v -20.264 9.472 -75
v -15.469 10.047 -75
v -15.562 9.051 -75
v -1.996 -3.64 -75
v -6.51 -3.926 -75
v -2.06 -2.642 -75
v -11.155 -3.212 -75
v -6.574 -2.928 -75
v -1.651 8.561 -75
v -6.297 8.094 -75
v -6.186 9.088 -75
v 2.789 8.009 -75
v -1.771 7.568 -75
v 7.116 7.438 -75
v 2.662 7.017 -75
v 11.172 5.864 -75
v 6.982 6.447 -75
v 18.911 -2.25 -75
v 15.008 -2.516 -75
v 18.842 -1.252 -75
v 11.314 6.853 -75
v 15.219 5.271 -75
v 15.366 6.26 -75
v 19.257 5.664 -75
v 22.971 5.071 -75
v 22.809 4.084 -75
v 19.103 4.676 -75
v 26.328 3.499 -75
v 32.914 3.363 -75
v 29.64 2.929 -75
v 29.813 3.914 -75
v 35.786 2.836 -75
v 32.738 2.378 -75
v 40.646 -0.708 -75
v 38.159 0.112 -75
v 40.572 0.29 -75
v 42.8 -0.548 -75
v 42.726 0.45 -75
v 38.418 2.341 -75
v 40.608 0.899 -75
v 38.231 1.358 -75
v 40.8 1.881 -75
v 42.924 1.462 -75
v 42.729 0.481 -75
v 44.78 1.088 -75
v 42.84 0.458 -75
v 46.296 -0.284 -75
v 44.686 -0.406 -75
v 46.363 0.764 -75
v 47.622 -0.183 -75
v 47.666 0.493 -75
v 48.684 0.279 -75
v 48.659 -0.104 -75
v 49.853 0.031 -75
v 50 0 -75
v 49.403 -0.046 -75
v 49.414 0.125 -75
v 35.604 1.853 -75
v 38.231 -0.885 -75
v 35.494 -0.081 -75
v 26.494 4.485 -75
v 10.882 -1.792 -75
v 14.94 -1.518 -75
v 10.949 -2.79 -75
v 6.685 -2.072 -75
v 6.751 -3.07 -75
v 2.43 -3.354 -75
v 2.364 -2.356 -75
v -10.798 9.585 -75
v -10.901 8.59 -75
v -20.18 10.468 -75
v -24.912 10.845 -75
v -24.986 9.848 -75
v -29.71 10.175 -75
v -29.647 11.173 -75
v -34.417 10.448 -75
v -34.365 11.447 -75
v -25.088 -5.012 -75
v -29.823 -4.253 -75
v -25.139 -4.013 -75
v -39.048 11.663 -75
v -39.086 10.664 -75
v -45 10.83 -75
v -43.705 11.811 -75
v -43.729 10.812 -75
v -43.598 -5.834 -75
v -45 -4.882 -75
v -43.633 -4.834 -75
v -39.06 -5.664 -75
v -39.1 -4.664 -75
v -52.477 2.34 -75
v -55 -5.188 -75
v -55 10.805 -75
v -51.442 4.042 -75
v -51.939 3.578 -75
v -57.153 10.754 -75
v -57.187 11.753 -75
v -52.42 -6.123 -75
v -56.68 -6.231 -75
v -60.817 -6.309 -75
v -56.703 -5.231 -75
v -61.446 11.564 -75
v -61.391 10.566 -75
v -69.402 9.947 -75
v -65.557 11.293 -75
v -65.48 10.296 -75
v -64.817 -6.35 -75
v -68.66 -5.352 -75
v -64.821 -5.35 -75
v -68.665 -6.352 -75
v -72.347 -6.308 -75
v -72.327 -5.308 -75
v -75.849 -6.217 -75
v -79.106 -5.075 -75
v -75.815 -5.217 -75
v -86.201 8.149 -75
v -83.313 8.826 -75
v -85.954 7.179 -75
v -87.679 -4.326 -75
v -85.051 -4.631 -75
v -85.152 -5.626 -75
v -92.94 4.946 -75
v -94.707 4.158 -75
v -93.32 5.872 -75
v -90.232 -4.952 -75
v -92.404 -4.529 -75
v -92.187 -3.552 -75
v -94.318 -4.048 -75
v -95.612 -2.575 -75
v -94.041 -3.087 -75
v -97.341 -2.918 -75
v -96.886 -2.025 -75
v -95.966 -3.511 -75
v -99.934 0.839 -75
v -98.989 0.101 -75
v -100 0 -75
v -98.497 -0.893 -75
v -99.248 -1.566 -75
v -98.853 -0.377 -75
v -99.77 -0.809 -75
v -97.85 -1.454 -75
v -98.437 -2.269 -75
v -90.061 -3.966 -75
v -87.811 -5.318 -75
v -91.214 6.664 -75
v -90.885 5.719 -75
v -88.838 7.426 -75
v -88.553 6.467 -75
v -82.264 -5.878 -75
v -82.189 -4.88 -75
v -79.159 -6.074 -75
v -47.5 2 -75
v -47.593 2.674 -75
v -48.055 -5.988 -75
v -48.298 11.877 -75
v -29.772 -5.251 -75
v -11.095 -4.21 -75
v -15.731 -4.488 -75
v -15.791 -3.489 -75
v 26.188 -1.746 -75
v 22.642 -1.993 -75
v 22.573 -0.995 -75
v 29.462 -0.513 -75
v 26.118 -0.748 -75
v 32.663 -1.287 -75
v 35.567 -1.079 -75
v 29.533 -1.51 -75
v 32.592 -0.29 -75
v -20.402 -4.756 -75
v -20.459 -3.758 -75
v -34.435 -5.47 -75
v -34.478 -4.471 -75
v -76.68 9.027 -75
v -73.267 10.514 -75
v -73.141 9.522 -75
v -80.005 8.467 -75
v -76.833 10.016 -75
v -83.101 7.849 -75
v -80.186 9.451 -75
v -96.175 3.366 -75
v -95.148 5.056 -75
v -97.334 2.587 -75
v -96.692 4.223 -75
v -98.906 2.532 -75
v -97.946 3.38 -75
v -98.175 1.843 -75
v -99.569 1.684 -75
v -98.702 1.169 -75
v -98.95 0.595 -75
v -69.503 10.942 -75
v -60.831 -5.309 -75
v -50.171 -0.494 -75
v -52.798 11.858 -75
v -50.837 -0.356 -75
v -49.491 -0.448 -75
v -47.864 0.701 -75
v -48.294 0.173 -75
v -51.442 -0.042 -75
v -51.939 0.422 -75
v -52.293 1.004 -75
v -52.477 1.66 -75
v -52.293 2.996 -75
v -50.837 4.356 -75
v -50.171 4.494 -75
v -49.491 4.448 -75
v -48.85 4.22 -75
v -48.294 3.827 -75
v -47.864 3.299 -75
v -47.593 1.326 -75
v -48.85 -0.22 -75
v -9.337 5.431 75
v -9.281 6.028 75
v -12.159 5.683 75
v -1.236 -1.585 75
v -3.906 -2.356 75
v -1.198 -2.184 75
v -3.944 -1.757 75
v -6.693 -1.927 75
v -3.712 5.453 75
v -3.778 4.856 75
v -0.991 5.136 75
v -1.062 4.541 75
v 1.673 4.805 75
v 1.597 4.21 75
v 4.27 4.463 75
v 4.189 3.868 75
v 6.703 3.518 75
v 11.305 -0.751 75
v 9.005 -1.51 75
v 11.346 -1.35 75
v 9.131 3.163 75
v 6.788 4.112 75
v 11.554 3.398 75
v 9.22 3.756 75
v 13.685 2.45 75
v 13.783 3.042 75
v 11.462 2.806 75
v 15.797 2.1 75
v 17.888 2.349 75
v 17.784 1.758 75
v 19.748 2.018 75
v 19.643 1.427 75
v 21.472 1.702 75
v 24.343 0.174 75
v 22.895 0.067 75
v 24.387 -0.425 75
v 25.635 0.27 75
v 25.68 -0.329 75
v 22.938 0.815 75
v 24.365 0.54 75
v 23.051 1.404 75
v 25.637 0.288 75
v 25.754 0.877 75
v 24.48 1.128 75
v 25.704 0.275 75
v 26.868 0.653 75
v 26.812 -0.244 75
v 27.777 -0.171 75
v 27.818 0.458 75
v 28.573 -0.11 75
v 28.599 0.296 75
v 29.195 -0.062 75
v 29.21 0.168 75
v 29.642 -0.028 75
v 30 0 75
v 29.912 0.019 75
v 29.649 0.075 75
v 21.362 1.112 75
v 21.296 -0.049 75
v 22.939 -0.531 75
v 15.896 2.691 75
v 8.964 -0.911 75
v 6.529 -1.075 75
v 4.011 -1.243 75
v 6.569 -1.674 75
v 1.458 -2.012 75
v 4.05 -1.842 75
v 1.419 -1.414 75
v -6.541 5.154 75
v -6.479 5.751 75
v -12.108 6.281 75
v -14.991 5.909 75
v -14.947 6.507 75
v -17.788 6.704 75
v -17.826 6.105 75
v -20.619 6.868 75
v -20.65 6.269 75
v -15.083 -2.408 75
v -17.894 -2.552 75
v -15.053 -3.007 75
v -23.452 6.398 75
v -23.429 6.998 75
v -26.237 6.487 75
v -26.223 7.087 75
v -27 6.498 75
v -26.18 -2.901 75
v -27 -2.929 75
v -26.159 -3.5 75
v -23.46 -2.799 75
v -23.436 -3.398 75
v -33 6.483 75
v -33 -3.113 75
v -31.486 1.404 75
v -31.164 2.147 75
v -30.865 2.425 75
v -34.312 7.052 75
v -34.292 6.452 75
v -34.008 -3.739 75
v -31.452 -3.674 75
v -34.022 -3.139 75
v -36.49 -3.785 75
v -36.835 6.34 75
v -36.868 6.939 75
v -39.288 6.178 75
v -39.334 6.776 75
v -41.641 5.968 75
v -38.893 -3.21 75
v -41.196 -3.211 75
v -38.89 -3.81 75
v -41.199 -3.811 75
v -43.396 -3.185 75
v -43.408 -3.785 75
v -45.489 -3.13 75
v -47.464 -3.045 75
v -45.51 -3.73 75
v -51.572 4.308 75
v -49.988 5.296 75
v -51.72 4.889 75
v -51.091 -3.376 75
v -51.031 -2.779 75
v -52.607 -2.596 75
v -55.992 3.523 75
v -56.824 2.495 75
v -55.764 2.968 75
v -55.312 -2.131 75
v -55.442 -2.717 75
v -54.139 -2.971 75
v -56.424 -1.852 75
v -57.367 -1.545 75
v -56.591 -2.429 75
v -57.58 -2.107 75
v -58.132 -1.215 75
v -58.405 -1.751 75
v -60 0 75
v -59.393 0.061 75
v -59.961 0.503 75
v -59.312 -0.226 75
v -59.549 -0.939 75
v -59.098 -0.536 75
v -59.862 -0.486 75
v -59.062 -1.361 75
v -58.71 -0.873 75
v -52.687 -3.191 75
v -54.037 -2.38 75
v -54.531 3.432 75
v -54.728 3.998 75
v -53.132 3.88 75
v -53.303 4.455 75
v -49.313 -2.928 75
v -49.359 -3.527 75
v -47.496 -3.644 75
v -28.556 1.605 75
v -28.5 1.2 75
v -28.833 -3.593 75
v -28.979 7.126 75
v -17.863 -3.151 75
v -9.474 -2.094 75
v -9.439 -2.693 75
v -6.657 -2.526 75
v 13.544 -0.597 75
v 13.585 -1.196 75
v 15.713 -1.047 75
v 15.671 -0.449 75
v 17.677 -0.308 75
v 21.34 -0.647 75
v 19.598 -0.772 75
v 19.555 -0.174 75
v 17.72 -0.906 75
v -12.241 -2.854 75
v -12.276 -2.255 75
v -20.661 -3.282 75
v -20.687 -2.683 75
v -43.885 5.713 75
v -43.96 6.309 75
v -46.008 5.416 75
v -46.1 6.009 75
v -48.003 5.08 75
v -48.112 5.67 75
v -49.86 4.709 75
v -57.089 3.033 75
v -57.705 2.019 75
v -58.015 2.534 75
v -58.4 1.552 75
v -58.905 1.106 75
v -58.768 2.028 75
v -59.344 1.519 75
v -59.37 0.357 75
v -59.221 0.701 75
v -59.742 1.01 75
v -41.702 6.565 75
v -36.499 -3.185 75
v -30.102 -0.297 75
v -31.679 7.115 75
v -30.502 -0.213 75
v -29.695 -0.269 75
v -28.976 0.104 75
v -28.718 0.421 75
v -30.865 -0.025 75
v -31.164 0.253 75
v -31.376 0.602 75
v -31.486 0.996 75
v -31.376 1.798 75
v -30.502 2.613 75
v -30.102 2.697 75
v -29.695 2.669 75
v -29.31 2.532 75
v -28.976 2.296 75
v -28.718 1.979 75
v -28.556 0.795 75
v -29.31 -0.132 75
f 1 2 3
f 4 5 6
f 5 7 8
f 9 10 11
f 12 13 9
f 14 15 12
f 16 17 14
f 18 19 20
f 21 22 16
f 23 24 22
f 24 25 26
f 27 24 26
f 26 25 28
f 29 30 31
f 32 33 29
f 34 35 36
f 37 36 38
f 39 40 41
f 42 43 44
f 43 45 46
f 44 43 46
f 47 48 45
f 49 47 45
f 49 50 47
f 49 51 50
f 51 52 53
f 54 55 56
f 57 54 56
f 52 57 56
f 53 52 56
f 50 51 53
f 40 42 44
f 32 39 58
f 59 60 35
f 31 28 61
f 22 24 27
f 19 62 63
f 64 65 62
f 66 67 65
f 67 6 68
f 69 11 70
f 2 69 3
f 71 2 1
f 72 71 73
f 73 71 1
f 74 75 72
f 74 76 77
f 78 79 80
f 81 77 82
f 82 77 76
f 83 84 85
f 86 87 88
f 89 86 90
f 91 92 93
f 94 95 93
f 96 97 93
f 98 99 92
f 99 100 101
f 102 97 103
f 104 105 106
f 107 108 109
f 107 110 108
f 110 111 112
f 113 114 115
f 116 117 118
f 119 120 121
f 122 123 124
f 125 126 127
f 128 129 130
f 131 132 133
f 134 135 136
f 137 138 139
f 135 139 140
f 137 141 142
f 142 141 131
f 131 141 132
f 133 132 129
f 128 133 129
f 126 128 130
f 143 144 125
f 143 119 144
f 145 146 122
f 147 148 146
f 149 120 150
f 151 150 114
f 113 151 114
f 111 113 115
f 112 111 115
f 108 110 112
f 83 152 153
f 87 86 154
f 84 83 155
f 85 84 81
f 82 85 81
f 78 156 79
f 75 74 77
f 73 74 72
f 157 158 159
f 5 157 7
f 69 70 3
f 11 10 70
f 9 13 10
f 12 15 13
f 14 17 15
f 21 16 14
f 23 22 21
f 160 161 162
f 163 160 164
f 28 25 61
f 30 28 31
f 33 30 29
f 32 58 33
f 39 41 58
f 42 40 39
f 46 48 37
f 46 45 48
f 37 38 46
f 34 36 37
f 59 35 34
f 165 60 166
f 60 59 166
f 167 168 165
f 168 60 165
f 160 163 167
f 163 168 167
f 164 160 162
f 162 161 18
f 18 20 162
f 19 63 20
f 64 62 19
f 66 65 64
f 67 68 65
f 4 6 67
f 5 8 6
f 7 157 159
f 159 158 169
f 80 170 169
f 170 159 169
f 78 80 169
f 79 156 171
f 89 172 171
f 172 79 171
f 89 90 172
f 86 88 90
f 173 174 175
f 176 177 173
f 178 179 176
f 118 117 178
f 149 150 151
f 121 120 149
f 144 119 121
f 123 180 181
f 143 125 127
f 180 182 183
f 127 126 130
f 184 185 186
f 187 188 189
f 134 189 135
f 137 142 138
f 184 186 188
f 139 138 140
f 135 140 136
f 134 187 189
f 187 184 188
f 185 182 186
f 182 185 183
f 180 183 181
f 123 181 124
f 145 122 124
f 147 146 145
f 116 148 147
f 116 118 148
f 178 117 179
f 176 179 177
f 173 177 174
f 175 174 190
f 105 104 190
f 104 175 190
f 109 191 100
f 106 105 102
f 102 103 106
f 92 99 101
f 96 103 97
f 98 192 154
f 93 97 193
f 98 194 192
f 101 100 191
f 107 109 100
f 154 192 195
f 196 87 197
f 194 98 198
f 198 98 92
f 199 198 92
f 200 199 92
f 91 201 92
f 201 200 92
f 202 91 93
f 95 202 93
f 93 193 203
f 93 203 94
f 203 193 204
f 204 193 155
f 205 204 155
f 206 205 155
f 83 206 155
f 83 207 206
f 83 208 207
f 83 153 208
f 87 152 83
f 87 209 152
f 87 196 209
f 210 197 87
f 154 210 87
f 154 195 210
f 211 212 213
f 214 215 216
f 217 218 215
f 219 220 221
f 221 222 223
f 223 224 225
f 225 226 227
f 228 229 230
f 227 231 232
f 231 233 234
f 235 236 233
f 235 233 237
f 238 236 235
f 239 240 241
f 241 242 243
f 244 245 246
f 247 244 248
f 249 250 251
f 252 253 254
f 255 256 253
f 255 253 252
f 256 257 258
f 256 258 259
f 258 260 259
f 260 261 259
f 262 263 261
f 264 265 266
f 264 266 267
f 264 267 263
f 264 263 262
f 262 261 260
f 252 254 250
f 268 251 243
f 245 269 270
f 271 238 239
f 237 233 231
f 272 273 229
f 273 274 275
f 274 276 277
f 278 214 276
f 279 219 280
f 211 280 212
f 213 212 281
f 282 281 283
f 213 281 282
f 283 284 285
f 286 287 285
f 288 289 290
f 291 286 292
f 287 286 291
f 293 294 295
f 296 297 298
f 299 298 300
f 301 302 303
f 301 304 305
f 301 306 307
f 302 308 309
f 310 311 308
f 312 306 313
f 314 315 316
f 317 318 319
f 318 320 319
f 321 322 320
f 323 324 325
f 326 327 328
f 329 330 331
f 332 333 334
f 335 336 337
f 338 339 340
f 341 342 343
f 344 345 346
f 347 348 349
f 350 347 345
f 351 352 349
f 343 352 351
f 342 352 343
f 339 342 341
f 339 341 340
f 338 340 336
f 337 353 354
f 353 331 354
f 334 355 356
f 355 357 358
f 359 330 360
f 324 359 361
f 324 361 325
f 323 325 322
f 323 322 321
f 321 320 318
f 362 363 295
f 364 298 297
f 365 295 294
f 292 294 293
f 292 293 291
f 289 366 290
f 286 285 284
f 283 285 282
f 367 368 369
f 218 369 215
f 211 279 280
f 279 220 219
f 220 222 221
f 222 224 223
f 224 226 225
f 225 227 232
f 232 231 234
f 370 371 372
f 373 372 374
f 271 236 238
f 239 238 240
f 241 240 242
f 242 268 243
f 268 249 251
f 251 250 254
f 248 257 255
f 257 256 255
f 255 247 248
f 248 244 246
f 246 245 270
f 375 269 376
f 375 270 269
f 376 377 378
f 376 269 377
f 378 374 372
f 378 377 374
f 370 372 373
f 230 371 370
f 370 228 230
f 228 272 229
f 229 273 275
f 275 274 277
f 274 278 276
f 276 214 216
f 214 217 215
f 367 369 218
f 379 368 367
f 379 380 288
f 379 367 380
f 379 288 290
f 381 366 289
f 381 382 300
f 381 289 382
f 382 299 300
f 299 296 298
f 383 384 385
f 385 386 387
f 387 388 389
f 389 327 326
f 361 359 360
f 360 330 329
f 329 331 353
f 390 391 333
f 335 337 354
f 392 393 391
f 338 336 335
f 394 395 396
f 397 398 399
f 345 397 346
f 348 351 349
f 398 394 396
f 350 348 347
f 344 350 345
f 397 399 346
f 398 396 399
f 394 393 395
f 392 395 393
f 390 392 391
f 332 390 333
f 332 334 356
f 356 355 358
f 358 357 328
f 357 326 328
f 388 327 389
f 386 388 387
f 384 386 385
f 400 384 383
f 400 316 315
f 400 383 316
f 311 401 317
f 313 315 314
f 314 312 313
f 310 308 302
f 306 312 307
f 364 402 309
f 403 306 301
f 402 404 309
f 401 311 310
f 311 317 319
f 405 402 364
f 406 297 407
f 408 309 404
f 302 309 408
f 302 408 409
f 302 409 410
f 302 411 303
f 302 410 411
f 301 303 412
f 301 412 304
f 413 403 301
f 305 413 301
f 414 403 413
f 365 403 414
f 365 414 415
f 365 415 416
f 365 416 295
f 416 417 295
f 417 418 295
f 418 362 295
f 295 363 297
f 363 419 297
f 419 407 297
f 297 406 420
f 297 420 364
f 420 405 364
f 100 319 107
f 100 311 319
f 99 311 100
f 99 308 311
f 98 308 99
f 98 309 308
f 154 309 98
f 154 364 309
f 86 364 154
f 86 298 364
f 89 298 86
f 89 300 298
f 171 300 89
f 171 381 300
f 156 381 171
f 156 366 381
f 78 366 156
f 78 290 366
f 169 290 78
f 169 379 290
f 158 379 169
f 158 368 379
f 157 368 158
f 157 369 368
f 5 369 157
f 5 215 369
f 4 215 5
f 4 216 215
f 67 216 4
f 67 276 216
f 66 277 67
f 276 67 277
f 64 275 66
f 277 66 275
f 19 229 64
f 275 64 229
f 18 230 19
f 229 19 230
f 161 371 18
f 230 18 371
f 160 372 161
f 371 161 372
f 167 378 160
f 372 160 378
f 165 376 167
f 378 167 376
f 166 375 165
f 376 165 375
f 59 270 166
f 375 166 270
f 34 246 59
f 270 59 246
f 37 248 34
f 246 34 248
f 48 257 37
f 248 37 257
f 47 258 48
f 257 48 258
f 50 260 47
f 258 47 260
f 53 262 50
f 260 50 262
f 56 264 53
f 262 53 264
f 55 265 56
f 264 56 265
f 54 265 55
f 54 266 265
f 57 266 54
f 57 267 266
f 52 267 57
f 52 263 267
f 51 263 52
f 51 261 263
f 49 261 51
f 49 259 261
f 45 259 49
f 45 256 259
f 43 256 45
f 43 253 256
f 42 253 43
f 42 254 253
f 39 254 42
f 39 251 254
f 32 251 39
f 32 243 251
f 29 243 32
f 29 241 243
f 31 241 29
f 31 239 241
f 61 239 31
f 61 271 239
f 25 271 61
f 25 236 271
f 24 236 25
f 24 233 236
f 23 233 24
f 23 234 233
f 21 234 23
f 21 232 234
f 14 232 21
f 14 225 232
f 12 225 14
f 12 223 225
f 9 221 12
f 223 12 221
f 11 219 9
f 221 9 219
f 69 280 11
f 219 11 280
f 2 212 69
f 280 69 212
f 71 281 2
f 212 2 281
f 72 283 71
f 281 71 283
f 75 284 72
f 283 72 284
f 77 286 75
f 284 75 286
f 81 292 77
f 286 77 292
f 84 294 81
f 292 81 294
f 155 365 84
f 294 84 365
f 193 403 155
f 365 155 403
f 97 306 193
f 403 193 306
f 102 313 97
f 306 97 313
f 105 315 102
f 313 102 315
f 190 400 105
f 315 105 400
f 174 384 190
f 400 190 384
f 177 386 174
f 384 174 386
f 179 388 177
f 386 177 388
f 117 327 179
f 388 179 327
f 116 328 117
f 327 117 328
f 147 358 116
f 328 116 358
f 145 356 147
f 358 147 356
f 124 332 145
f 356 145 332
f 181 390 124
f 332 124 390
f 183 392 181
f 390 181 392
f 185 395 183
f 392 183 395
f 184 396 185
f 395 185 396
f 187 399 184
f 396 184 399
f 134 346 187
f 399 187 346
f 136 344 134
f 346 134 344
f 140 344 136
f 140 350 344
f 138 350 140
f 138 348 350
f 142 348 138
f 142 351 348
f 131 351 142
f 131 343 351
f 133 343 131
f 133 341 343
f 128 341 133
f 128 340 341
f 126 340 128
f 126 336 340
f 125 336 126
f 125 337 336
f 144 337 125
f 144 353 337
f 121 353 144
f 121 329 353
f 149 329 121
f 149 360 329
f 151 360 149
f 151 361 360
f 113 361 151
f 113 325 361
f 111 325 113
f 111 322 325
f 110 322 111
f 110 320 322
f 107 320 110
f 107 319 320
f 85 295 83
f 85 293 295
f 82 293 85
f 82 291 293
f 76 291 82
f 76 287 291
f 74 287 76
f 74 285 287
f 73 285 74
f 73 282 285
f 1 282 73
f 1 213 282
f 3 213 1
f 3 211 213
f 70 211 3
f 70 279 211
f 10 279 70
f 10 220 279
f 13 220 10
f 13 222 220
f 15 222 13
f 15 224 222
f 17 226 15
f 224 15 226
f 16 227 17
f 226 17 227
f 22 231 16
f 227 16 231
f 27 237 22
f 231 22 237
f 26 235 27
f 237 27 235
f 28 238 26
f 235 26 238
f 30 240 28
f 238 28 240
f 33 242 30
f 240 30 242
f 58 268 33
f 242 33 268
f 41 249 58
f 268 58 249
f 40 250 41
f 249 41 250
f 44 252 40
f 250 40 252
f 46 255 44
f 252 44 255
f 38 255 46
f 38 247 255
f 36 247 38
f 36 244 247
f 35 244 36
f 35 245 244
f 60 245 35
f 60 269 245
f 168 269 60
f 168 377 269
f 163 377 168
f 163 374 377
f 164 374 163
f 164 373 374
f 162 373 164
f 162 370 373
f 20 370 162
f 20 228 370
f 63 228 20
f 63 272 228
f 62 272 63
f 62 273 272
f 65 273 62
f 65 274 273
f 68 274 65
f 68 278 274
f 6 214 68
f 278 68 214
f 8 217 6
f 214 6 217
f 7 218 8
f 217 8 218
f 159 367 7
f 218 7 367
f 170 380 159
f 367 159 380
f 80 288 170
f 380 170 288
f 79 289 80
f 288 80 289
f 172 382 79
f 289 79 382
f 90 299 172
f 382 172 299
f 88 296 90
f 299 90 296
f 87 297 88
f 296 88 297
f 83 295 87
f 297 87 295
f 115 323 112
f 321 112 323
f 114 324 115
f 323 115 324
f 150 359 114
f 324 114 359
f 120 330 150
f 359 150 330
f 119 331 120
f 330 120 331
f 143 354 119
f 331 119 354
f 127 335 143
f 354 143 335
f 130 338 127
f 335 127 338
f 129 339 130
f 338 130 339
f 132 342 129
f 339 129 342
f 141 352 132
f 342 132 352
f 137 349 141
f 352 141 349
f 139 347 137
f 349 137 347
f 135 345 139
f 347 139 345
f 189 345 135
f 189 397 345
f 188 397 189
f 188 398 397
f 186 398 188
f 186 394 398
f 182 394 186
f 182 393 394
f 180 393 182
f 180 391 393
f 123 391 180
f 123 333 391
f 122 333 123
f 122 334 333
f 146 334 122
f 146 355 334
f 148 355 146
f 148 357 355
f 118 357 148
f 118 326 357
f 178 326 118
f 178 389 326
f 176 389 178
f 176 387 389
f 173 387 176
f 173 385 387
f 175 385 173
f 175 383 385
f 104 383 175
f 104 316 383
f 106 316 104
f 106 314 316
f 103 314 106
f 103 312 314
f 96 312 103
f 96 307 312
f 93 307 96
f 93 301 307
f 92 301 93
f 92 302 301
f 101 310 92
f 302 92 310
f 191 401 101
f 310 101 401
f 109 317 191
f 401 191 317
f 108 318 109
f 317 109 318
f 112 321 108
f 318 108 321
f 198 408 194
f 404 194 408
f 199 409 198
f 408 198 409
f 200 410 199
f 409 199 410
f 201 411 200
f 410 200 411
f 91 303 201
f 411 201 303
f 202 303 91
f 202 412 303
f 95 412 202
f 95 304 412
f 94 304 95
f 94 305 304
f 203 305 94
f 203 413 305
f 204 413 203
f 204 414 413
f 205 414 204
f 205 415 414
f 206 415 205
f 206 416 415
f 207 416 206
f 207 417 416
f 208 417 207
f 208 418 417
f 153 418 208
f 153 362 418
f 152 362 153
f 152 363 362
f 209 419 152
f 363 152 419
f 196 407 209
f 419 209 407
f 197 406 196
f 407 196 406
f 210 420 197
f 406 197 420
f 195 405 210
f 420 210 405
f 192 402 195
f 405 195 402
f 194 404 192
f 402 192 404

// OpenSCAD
//------------------------------------------------------------------------------------------
// THIS CODE WAS GENERATED WITH GRAPHSCAD
//------------------------------------------------------------------------------------------
// F:/workspace/graphscad/graphscadfiles/callnacamodule.scad
//------------------------------------------------------------------------------------------
// Graphscad is a graphical nodal editor to create .SCAD files
//
// More info here : http://graphscad.free.fr
//
// Scad Files created with Graphscad can be edited by graphscad
// Scad Files created with Graphscad can be read by Openscad
//
//------------------------------------------------------------------------------------------
use <nacaprofile.scad>
module callnacamodule()
{
 function node_callmodule2d_matrix(i=0,j=0,k=0,l=0,m=0,n=0) = translate([0,0,0]);
 module node_callmodule2d(i=0,j=0,k=0,l=0,m=0,n=0)
 {
  nacaprofile(2412,150);
 }
 function node_square_matrix(i=0,j=0,k=0,l=0,m=0,n=0) = translate([50,0,0]);
 module node_square(i=0,j=0,k=0,l=0,m=0,n=0)
 {
  translate([50,0,0])square(size=[10,100],center=true);
 }
 function node_boolean2d_matrix(i=0,j=0,k=0,l=0,m=0,n=0) = translate([0,0,0]);
 module node_boolean2d(i=0,j=0,k=0,l=0,m=0,n=0)
 {
  intersection()
  {
   node_square(i,j,k,l,m,n);
   node_callmodule2d(i,j,k,l,m,n);
  }
 }
 function node_boolean2d0_matrix(i=0,j=0,k=0,l=0,m=0,n=0) = translate([0,0,0]);
 module node_boolean2d0(i=0,j=0,k=0,l=0,m=0,n=0)
 {
  union()
  {
   node_boolean2d(i,j,k,l,m,n);
   node_boolean2d1(i,j,k,l,m,n);
  }
 }
 function node_offset_matrix(i=0,j=0,k=0,l=0,m=0,n=0) = translate([0,0,0]);
 module node_offset(i=0,j=0,k=0,l=0,m=0,n=0)
 {
  offset(r=-1.0)
  {
   node_callmodule2d(i,j,k,l,m,n);
  }
 }
 function node_boolean2d1_matrix(i=0,j=0,k=0,l=0,m=0,n=0) = translate([0,0,0]);
 module node_boolean2d1(i=0,j=0,k=0,l=0,m=0,n=0)
 {
  difference()
  {
   node_callmodule2d(i,j,k,l,m,n);
   node_offset(i,j,k,l,m,n);
  }
 }
 function node_circle_matrix(i=0,j=0,k=0,l=0,m=0,n=0) = translate([50,2.0,0]);
 module node_circle(i=0,j=0,k=0,l=0,m=0,n=0)
 {
  translate([50,2.0,0])circle(r=2.5,$fn=(16+2.5*3.14116));
 }
 function node_boolean2d2_matrix(i=0,j=0,k=0,l=0,m=0,n=0) = translate([-100,0,0]);
 module node_boolean2d2(i=0,j=0,k=0,l=0,m=0,n=0)
 {
  translate([-100,0,0])difference()
  {
   node_boolean2d0(i,j,k,l,m,n);
   node_circle(i,j,k,l,m,n);
  }
 }
 function node_linearextrude_matrix(i=0,j=0,k=0,l=0,m=0,n=0) = translate([0,0,0]);
 module node_linearextrude(i=0,j=0,k=0,l=0,m=0,n=0)
 {
  linear_extrude(height=150,center=true,convexity=1,twist=0,slices=1,scale=0.6)
  {
   node_boolean2d2(i,j,k,l,m,n);
  }
 }
 node_linearextrude();
 /*--------------------------------------------------------------------------------------------------------
  Graphscad Utils functions
  This code is Used By Graphscad Nodal Editor to generate SCAD files
 --------------------------------------------------------------------------------------------------------*/
 function det4x4(a) =
 a[0][0]*a[1][1]*a[2][2]*a[3][3] + a[0][0]*a[1][2]*a[2][3]*a[3][1] + a[0][0]*a[1][3]*a[2][1]*a[3][2]
 + a[0][1]*a[1][0]*a[2][3]*a[3][2] + a[0][1]*a[1][2]*a[2][0]*a[3][3] + a[0][1]*a[1][3]*a[2][2]*a[3][0]
 + a[0][2]*a[1][0]*a[2][1]*a[3][3] + a[0][2]*a[1][1]*a[2][3]*a[3][0] + a[0][2]*a[1][3]*a[2][0]*a[3][1]
 + a[0][3]*a[1][0]*a[2][2]*a[3][1] + a[0][3]*a[1][1]*a[2][0]*a[3][2] + a[0][3]*a[1][2]*a[2][1]*a[3][0]
 - a[0][0]*a[1][1]*a[2][3]*a[3][2] - a[0][0]*a[1][2]*a[2][1]*a[3][3] - a[0][0]*a[1][3]*a[2][2]*a[3][1]
 - a[0][1]*a[1][0]*a[2][2]*a[3][3] - a[0][1]*a[1][2]*a[2][3]*a[3][0] - a[0][1]*a[1][3]*a[2][0]*a[3][2]
 - a[0][2]*a[1][0]*a[2][3]*a[3][1] - a[0][2]*a[1][1]*a[2][0]*a[3][3] - a[0][2]*a[1][3]*a[2][1]*a[3][0]
 - a[0][3]*a[1][0]*a[2][1]*a[3][2] - a[0][3]*a[1][1]*a[2][2]*a[3][0] - a[0][3]*a[1][2]*a[2][0]*a[3][1];
 function invb00(a) = a[1][1]*a[2][2]*a[3][3] + a[1][2]*a[2][3]*a[3][1] + a[1][3]*a[2][1]*a[3][2] - a[1][1]*a[2][3]*a[3][2] - a[1][2]*a[2][1]*a[3][3] - a[1][3]*a[2][2]*a[3][1];
 function invb01(a) = a[0][1]*a[2][3]*a[3][2] + a[0][2]*a[2][1]*a[3][3] + a[0][3]*a[2][2]*a[3][1] - a[0][1]*a[2][2]*a[3][3] - a[0][2]*a[2][3]*a[3][1] - a[0][3]*a[2][1]*a[3][2];
 function invb02(a) = a[0][1]*a[1][2]*a[3][3] + a[0][2]*a[1][3]*a[3][1] + a[0][3]*a[1][1]*a[3][2] - a[0][1]*a[1][3]*a[3][2] - a[0][2]*a[1][1]*a[3][3] - a[0][3]*a[1][2]*a[3][1];
 function invb03(a) = a[0][1]*a[1][3]*a[2][2] + a[0][2]*a[1][1]*a[2][3] + a[0][3]*a[1][2]*a[2][1] - a[0][1]*a[1][2]*a[2][3] - a[0][2]*a[1][3]*a[2][1] - a[0][3]*a[1][1]*a[2][2];
 function invb10(a) = a[1][0]*a[2][3]*a[3][2] + a[1][2]*a[2][0]*a[3][3] + a[1][3]*a[2][2]*a[3][0] - a[1][0]*a[2][2]*a[3][3] - a[1][2]*a[2][3]*a[3][0] - a[1][3]*a[2][0]*a[3][2];
 function invb11(a) = a[0][0]*a[2][2]*a[3][3] + a[0][2]*a[2][3]*a[3][0] + a[0][3]*a[2][0]*a[3][2] - a[0][0]*a[2][3]*a[3][2] - a[0][2]*a[2][0]*a[3][3] - a[0][3]*a[2][2]*a[3][0];
 function invb12(a) = a[0][0]*a[1][3]*a[3][2] + a[0][2]*a[1][0]*a[3][3] + a[0][3]*a[1][2]*a[3][0] - a[0][0]*a[1][2]*a[3][3] - a[0][2]*a[1][3]*a[3][0] - a[0][3]*a[1][0]*a[3][2];
 function invb13(a) = a[0][0]*a[1][2]*a[2][3] + a[0][2]*a[1][3]*a[2][0] + a[0][3]*a[1][0]*a[2][2] - a[0][0]*a[1][3]*a[2][2] - a[0][2]*a[1][0]*a[2][3] - a[0][3]*a[1][2]*a[2][0];
 function invb20(a) = a[1][0]*a[2][1]*a[3][3] + a[1][1]*a[2][3]*a[3][0] + a[1][3]*a[2][0]*a[3][1] - a[1][0]*a[2][3]*a[3][1] - a[1][1]*a[2][0]*a[3][3] - a[1][3]*a[2][1]*a[3][0];
 function invb21(a) = a[0][0]*a[2][3]*a[3][1] + a[0][1]*a[2][0]*a[3][3] + a[0][3]*a[2][1]*a[3][0] - a[0][0]*a[2][1]*a[3][3] - a[0][1]*a[2][3]*a[3][0] - a[0][3]*a[2][0]*a[3][1];
 function invb22(a) = a[0][0]*a[1][1]*a[3][3] + a[0][1]*a[1][3]*a[3][0] + a[0][3]*a[1][0]*a[3][1] - a[0][0]*a[1][3]*a[3][1] - a[0][1]*a[1][0]*a[3][3] - a[0][3]*a[1][1]*a[3][0];
 function invb23(a) = a[0][0]*a[1][3]*a[2][1] + a[0][1]*a[1][0]*a[2][3] + a[0][3]*a[1][1]*a[2][0] - a[0][0]*a[1][1]*a[2][3] - a[0][1]*a[1][3]*a[2][0] - a[0][3]*a[1][0]*a[2][1];
 function invb30(a) = a[1][0]*a[2][2]*a[3][1] + a[1][1]*a[2][0]*a[3][2] + a[1][2]*a[2][1]*a[3][0] - a[1][0]*a[2][1]*a[3][2] - a[1][1]*a[2][2]*a[3][0] - a[1][2]*a[2][0]*a[3][1];
 function invb31(a) = a[0][0]*a[2][1]*a[3][2] + a[0][1]*a[2][2]*a[3][0] + a[0][2]*a[2][0]*a[3][1] - a[0][0]*a[2][2]*a[3][1] - a[0][1]*a[2][0]*a[3][2] - a[0][2]*a[2][1]*a[3][0];
 function invb32(a) = a[0][0]*a[1][2]*a[3][1] + a[0][1]*a[1][0]*a[3][2] + a[0][2]*a[1][1]*a[3][0] - a[0][0]*a[1][1]*a[3][2] - a[0][1]*a[1][2]*a[3][0] - a[0][2]*a[1][0]*a[3][1];
 function invb33(a) = a[0][0]*a[1][1]*a[2][2] + a[0][1]*a[1][2]*a[2][0] + a[0][2]*a[1][0]*a[2][1] - a[0][0]*a[1][2]*a[2][1] - a[0][1]*a[1][0]*a[2][2] - a[0][2]*a[1][1]*a[2][0];
 function inv4x4(a)= (1/det4x4(a))*[
 [invb00(a),invb01(a),invb02(a),invb03(a)],
 [invb10(a),invb11(a),invb12(a),invb13(a)],
 [invb20(a),invb21(a),invb22(a),invb23(a)],
 [invb30(a),invb31(a),invb32(a),invb33(a)]];
 function onlytranslate(a)=  [
                        [1,0,0,a[0][3]],
                        [0,1,0,a[1][3]],
                        [0,0,1,a[2][3]],
                        [0,0,0,1]];
 function negonlytranslate(a)=[
                        [1,0,0,-a[0][3]],
                        [0,1,0,-a[1][3]],
                        [0,0,1,-a[2][3]],
                        [0,0,0,1]];
 function lookatvec(t,parentmat) = [t[0]-parentmat[0][3],
                                 t[1]-parentmat[1][3],
                                 t[2]-parentmat[2][3]];
 /*
              rx = '0'
              ry = 'acos('+tz+'/norm(['+tx+','+ty+','+tz+']))'
              rz = 'atan2('+ty+','+tx+')'
 */
 function lookatrot(t,parentmat) = [0,
                                 acos((t[2]-parentmat[2][3])/norm(lookatvec(t,parentmat))),
                                 atan2(t[1]-parentmat[1][3],t[0]-parentmat[0][3])];
 function gettranslation(m) = [m[0][3],m[1][3],m[2][3]];
 function vectormulmatrix(v,m) = m*v;
 function vectorlength(v) = norm(v);
 function vectorx(v) = v[0];
 function vectory(v) = v[1];
 function vectorz(v) = v[2];
 function vectoradd(a,b) = (a+b);
 function vectorsub(a,b) = (a-b);
 function vectormul(a,b) = (a*b);
 function vectordiv(a,b) = (a*(1/b));
 function scale(v)=[[v[0],0,0,0],
                    [0,v[1],0,0],
                    [0,0,v[2],0],
                    [0,0,0,1]];
 function rotatex(a)=[[1,0,0,0],
                      [0,cos(a),-sin(a),0],
                      [0,sin(a),cos(a),0],
                      [0,0,0,1]];
 function rotatey(a)=[[cos(a),0,sin(a),0],
                      [0,1,0,0],
                      [-sin(a),0,cos(a),0],
                      [0,0,0,1]];
 function rotatez(a)=[[cos(a),-sin(a),0,0],
                      [sin(a),cos(a),0,0],
                      [0,0,1,0],
                      [0,0,0,1]];
 function rotatea(c,s,l,m,n)=[[l*l*(1-c)+c,m*l*(1-c)-n*s,n*l*(1-c)+m*s,0],
                              [l*m*(1-c)+n*s,m*m*(1-c)+c,n*m*(1-c)-l*s,0],
                              [l*n*(1-c)-m*s,m*n*(1-c)+l*s,n*n*(1-c)+c,0],
                              [0,0,0,1]];
 function rotateanv(a,nv)=rotatea(cos(a),sin(a),nv[0],nv[1],nv[2]);
 function rotate(a,v, normV=true)=(v==undef)?rotatez(a[2])*rotatey(a[1])*rotatex(a[0]):
                      normV ? rotateanv(a,v/sqrt(v*v)) : rotateanv(a,v);
 function translate(v)=[[1,0,0,v[0]],
                        [0,1,0,v[1]],
                        [0,0,1,v[2]],
                        [0,0,0,1]];
 function mirrorabc(a,b,c)=[[1-2*a*a,-2*a*b,-2*a*c,0],
                            [-2*a*b,1-2*b*b,-2*b*c,0],
                            [-2*a*c,-2*b*c,1-2*c*c,0],
                            [0,0,0,1]];
 function mirrornv(nv)=mirrorabc(nv[0],nv[1],nv[2]);
 function mirror(v)=mirrornv(v/sqrt(v*v));
}
callnacamodule();


/*BEGINGRAPHSCAD{
    "nodes": [
        {
            "name": "node_callmodule2d",
            "inputplugs": [
                {
                    "tip": "filename of module (a graphscad file .scad)",
                    "type": "filename",
                    "name": "filename",
                    "value": "nacaprofile.scad"
                },
                {
                    "tip": "x translation of output object2d ",
                    "type": "str",
                    "name": "tx",
                    "value": "0"
                },
                {
                    "tip": "y translation of output object2d",
                    "type": "str",
                    "name": "ty",
                    "value": "0"
                },
                {
                    "tip": "z translation of output object2d",
                    "type": "str",
                    "name": "tz",
                    "value": "0"
                },
                {
                    "type": "str",
                    "name": "param1",
                    "value": "2412"
                },
                {
                    "type": "str",
                    "name": "param2",
                    "value": "150"
                },
                {
                    "type": "str",
                    "name": "param3",
                    "value": ""
                },
                {
                    "type": "str",
                    "name": "param4",
                    "value": ""
                },
                {
                    "type": "str",
                    "name": "param5",
                    "value": ""
                },
                {
                    "type": "str",
                    "name": "param6",
                    "value": ""
                },
                {
                    "type": "str",
                    "name": "param7",
                    "value": ""
                },
                {
                    "type": "str",
                    "name": "param8",
                    "value": ""
                },
                {
                    "type": "str",
                    "name": "param9",
                    "value": ""
                },
                {
                    "type": "str",
                    "name": "param10",
                    "value": ""
                },
                {
                    "type": "str",
                    "name": "param11",
                    "value": ""
                },
                {
                    "type": "str",
                    "name": "param12",
                    "value": ""
                },
                {
                    "type": "str",
                    "name": "param13",
                    "value": ""
                },
                {
                    "type": "str",
                    "name": "param14",
                    "value": ""
                },
                {
                    "type": "str",
                    "name": "param15",
                    "value": ""
                },
                {
                    "type": "str",
                    "name": "param16",
                    "value": ""
                },
                {
                    "type": "str",
                    "name": "param17",
                    "value": ""
                },
                {
                    "type": "str",
                    "name": "param18",
                    "value": ""
                },
                {
                    "type": "str",
                    "name": "param19",
                    "value": ""
                },
                {
                    "type": "str",
                    "name": "param20",
                    "value": ""
                }
            ],
            "typename": "Node_callmodule2d",
            "version": 1,
            "y": 40.40630084960637,
            "x": -615.465020369126
        },
        {
            "name": "node_square",
            "inputplugs": [
                {
                    "type": "str",
                    "name": "x",
                    "value": "10"
                },
                {
                    "type": "str",
                    "name": "y",
                    "value": "100"
                },
                {
                    "type": "str",
                    "name": "tx",
                    "value": "50"
                },
                {
                    "type": "str",
                    "name": "ty",
                    "value": "0"
                },
                {
                    "type": "str",
                    "name": "tz",
                    "value": "0"
                },
                {
                    "type": "str",
                    "name": "center",
                    "value": "true",
                    "combo": [
                        "true",
                        "false"
                    ]
                }
            ],
            "typename": "Node_square",
            "version": 1,
            "y": -255.04490727403552,
            "x": -598.2711103660008
        },
        {
            "name": "node_boolean2d",
            "inputplugs": [
                {
                    "type": "str",
                    "name": "op",
                    "value": "intersection",
                    "combo": [
                        "difference",
                        "union",
                        "intersection"
                    ]
                },
                {
                    "tip": "x translation of output object",
                    "type": "str",
                    "name": "tx",
                    "value": "0"
                },
                {
                    "tip": "y translation of output object",
                    "type": "str",
                    "name": "ty",
                    "value": "0"
                },
                {
                    "tip": "z translation of output object",
                    "type": "str",
                    "name": "tz",
                    "value": "0"
                },
                {
                    "tip": "First object of boolean operation",
                    "connection": "node_square.object2d",
                    "type": "object2d",
                    "name": "object2d1",
                    "value": ""
                },
                {
                    "tip": "a 2D object",
                    "connection": "node_callmodule2d.object2d",
                    "type": "object2d",
                    "name": "object2d2",
                    "value": ""
                },
                {
                    "tip": "a 2D object",
                    "type": "object2d",
                    "name": "object2d3",
                    "value": ""
                },
                {
                    "tip": "a 2D object",
                    "type": "object2d",
                    "name": "object2d4",
                    "value": ""
                },
                {
                    "tip": "a 2D object",
                    "type": "object2d",
                    "name": "object2d5",
                    "value": ""
                },
                {
                    "tip": "a 2D object",
                    "type": "object2d",
                    "name": "object2d6",
                    "value": ""
                },
                {
                    "tip": "a 2D object",
                    "type": "object2d",
                    "name": "object2d7",
                    "value": ""
                },
                {
                    "tip": "a 2D object",
                    "type": "object2d",
                    "name": "object2d8",
                    "value": ""
                },
                {
                    "tip": "a 2D object",
                    "type": "object2d",
                    "name": "object2d9",
                    "value": ""
                },
                {
                    "tip": "a 2D object",
                    "type": "object2d",
                    "name": "object2d10",
                    "value": ""
                },
                {
                    "tip": "a 2D object",
                    "type": "object2d",
                    "name": "object2d11",
                    "value": ""
                },
                {
                    "tip": "a 2D object",
                    "type": "object2d",
                    "name": "object2d12",
                    "value": ""
                },
                {
                    "tip": "a 2D object",
                    "type": "object2d",
                    "name": "object2d13",
                    "value": ""
                },
                {
                    "tip": "a 2D object",
                    "type": "object2d",
                    "name": "object2d14",
                    "value": ""
                },
                {
                    "tip": "a 2D object",
                    "type": "object2d",
                    "name": "object2d15",
                    "value": ""
                },
                {
                    "tip": "a 2D object",
                    "type": "object2d",
                    "name": "object2d16",
                    "value": ""
                },
                {
                    "tip": "a 2D object",
                    "type": "object2d",
                    "name": "object2d17",
                    "value": ""
                },
                {
                    "tip": "a 2D object",
                    "type": "object2d",
                    "name": "object2d18",
                    "value": ""
                },
                {
                    "tip": "a 2D object",
                    "type": "object2d",
                    "name": "object2d19",
                    "value": ""
                },
                {
                    "tip": "a 2D object",
                    "type": "object2d",
                    "name": "object2d20",
                    "value": ""
                }
            ],
            "typename": "Node_boolean2d",
            "version": 1,
            "y": -119.19603833254918,
            "x": -357.1805282344918
        },
        {
            "name": "node_boolean2d0",
            "inputplugs": [
                {
                    "type": "str",
                    "name": "op",
                    "value": "union",
                    "combo": [
                        "difference",
                        "union",
                        "intersection"
                    ]
                },
                {
                    "tip": "x translation of output object",
                    "type": "str",
                    "name": "tx",
                    "value": "0"
                },
                {
                    "tip": "y translation of output object",
                    "type": "str",
                    "name": "ty",
                    "value": "0"
                },
                {
                    "tip": "z translation of output object",
                    "type": "str",
                    "name": "tz",
                    "value": "0"
                },
                {
                    "tip": "First object of boolean operation",
                    "connection": "node_boolean2d.object2d",
                    "type": "object2d",
                    "name": "object2d1",
                    "value": ""
                },
                {
                    "tip": "a 2D object",
                    "connection": "node_boolean2d1.object2d",
                    "type": "object2d",
                    "name": "object2d2",
                    "value": ""
                },
                {
                    "tip": "a 2D object",
                    "type": "object2d",
                    "name": "object2d3",
                    "value": ""
                },
                {
                    "tip": "a 2D object",
                    "type": "object2d",
                    "name": "object2d4",
                    "value": ""
                },
                {
                    "tip": "a 2D object",
                    "type": "object2d",
                    "name": "object2d5",
                    "value": ""
                },
                {
                    "tip": "a 2D object",
                    "type": "object2d",
                    "name": "object2d6",
                    "value": ""
                },
                {
                    "tip": "a 2D object",
                    "type": "object2d",
                    "name": "object2d7",
                    "value": ""
                },
                {
                    "tip": "a 2D object",
                    "type": "object2d",
                    "name": "object2d8",
                    "value": ""
                },
                {
                    "tip": "a 2D object",
                    "type": "object2d",
                    "name": "object2d9",
                    "value": ""
                },
                {
                    "tip": "a 2D object",
                    "type": "object2d",
                    "name": "object2d10",
                    "value": ""
                },
                {
                    "tip": "a 2D object",
                    "type": "object2d",
                    "name": "object2d11",
                    "value": ""
                },
                {
                    "tip": "a 2D object",
                    "type": "object2d",
                    "name": "object2d12",
                    "value": ""
                },
                {
                    "tip": "a 2D object",
                    "type": "object2d",
                    "name": "object2d13",
                    "value": ""
                },
                {
                    "tip": "a 2D object",
                    "type": "object2d",
                    "name": "object2d14",
                    "value": ""
                },
                {
                    "tip": "a 2D object",
                    "type": "object2d",
                    "name": "object2d15",
                    "value": ""
                },
                {
                    "tip": "a 2D object",
                    "type": "object2d",
                    "name": "object2d16",
                    "value": ""
                },
                {
                    "tip": "a 2D object",
                    "type": "object2d",
                    "name": "object2d17",
                    "value": ""
                },
                {
                    "tip": "a 2D object",
                    "type": "object2d",
                    "name": "object2d18",
                    "value": ""
                },
                {
                    "tip": "a 2D object",
                    "type": "object2d",
                    "name": "object2d19",
                    "value": ""
                },
                {
                    "tip": "a 2D object",
                    "type": "object2d",
                    "name": "object2d20",
                    "value": ""
                }
            ],
            "typename": "Node_boolean2d",
            "version": 1,
            "y": -15.239327745579033,
            "x": -7.9810708548981495
        },
        {
            "name": "node_offset",
            "inputplugs": [
                {
                    "connection": "node_callmodule2d.object2d",
                    "type": "object2d",
                    "name": "object2d",
                    "value": ""
                },
                {
                    "type": "str",
                    "name": "op",
                    "value": "Round",
                    "combo": [
                        "Round",
                        "Delta"
                    ]
                },
                {
                    "type": "str",
                    "name": "value",
                    "value": "-1.0"
                },
                {
                    "type": "str",
                    "name": "chamfer",
                    "value": "false",
                    "combo": [
                        "true",
                        "false"
                    ]
                }
            ],
            "typename": "Node_offset",
            "version": 1,
            "y": 312.43633603288066,
            "x": -360.5536600675054
        },
        {
            "name": "node_boolean2d1",
            "inputplugs": [
                {
                    "type": "str",
                    "name": "op",
                    "value": "difference",
                    "combo": [
                        "difference",
                        "union",
                        "intersection"
                    ]
                },
                {
                    "tip": "x translation of output object",
                    "type": "str",
                    "name": "tx",
                    "value": "0"
                },
                {
                    "tip": "y translation of output object",
                    "type": "str",
                    "name": "ty",
                    "value": "0"
                },
                {
                    "tip": "z translation of output object",
                    "type": "str",
                    "name": "tz",
                    "value": "0"
                },
                {
                    "tip": "First object of boolean operation",
                    "connection": "node_callmodule2d.object2d",
                    "type": "object2d",
                    "name": "object2d1",
                    "value": ""
                },
                {
                    "tip": "a 2D object",
                    "connection": "node_offset.object2d",
                    "type": "object2d",
                    "name": "object2d2",
                    "value": ""
                },
                {
                    "tip": "a 2D object",
                    "type": "object2d",
                    "name": "object2d3",
                    "value": ""
                },
                {
                    "tip": "a 2D object",
                    "type": "object2d",
                    "name": "object2d4",
                    "value": ""
                },
                {
                    "tip": "a 2D object",
                    "type": "object2d",
                    "name": "object2d5",
                    "value": ""
                },
                {
                    "tip": "a 2D object",
                    "type": "object2d",
                    "name": "object2d6",
                    "value": ""
                },
                {
                    "tip": "a 2D object",
                    "type": "object2d",
                    "name": "object2d7",
                    "value": ""
                },
                {
                    "tip": "a 2D object",
                    "type": "object2d",
                    "name": "object2d8",
                    "value": ""
                },
                {
                    "tip": "a 2D object",
                    "type": "object2d",
                    "name": "object2d9",
                    "value": ""
                },
                {
                    "tip": "a 2D object",
                    "type": "object2d",
                    "name": "object2d10",
                    "value": ""
                },
                {
                    "tip": "a 2D object",
                    "type": "object2d",
                    "name": "object2d11",
                    "value": ""
                },
                {
                    "tip": "a 2D object",
                    "type": "object2d",
                    "name": "object2d12",
                    "value": ""
                },
                {
                    "tip": "a 2D object",
                    "type": "object2d",
                    "name": "object2d13",
                    "value": ""
                },
                {
                    "tip": "a 2D object",
                    "type": "object2d",
                    "name": "object2d14",
                    "value": ""
                },
                {
                    "tip": "a 2D object",
                    "type": "object2d",
                    "name": "object2d15",
                    "value": ""
                },
                {
                    "tip": "a 2D object",
                    "type": "object2d",
                    "name": "object2d16",
                    "value": ""
                },
                {
                    "tip": "a 2D object",
                    "type": "object2d",
                    "name": "object2d17",
                    "value": ""
                },
                {
                    "tip": "a 2D object",
                    "type": "object2d",
                    "name": "object2d18",
                    "value": ""
                },
                {
                    "tip": "a 2D object",
                    "type": "object2d",
                    "name": "object2d19",
                    "value": ""
                },
                {
                    "tip": "a 2D object",
                    "type": "object2d",
                    "name": "object2d20",
                    "value": ""
                }
            ],
            "typename": "Node_boolean2d",
            "version": 1,
            "y": 145.38599763601854,
            "x": -196.71582817827561
        },
        {
            "name": "node_circle",
            "inputplugs": [
                {
                    "tip": "radius of circle",
                    "type": "str",
                    "name": "radius",
                    "value": "2.5"
                },
                {
                    "tip": "x translation of circle",
                    "type": "str",
                    "name": "tx",
                    "value": "50"
                },
                {
                    "tip": "y translation of circle",
                    "type": "str",
                    "name": "ty",
                    "value": "2.0"
                },
                {
                    "tip": "z translation of circle",
                    "type": "str",
                    "name": "tz",
                    "value": "0"
                },
                {
                    "type": "str",
                    "name": "$fn",
                    "value": ""
                }
            ],
            "typename": "Node_circle",
            "version": 1,
            "y": 232.92679996898943,
            "x": 16.91585457924947
        },
        {
            "name": "node_boolean2d2",
            "inputplugs": [
                {
                    "type": "str",
                    "name": "op",
                    "value": "difference",
                    "combo": [
                        "difference",
                        "union",
                        "intersection"
                    ]
                },
                {
                    "tip": "x translation of output object",
                    "type": "str",
                    "name": "tx",
                    "value": "-100"
                },
                {
                    "tip": "y translation of output object",
                    "type": "str",
                    "name": "ty",
                    "value": "0"
                },
                {
                    "tip": "z translation of output object",
                    "type": "str",
                    "name": "tz",
                    "value": "0"
                },
                {
                    "tip": "First object of boolean operation",
                    "connection": "node_boolean2d0.object2d",
                    "type": "object2d",
                    "name": "object2d1",
                    "value": ""
                },
                {
                    "tip": "a 2D object",
                    "connection": "node_circle.object2d",
                    "type": "object2d",
                    "name": "object2d2",
                    "value": ""
                },
                {
                    "tip": "a 2D object",
                    "type": "object2d",
                    "name": "object2d3",
                    "value": ""
                },
                {
                    "tip": "a 2D object",
                    "type": "object2d",
                    "name": "object2d4",
                    "value": ""
                },
                {
                    "tip": "a 2D object",
                    "type": "object2d",
                    "name": "object2d5",
                    "value": ""
                },
                {
                    "tip": "a 2D object",
                    "type": "object2d",
                    "name": "object2d6",
                    "value": ""
                },
                {
                    "tip": "a 2D object",
                    "type": "object2d",
                    "name": "object2d7",
                    "value": ""
                },
                {
                    "tip": "a 2D object",
                    "type": "object2d",
                    "name": "object2d8",
                    "value": ""
                },
                {
                    "tip": "a 2D object",
                    "type": "object2d",
                    "name": "object2d9",
                    "value": ""
                },
                {
                    "tip": "a 2D object",
                    "type": "object2d",
                    "name": "object2d10",
                    "value": ""
                },
                {
                    "tip": "a 2D object",
                    "type": "object2d",
                    "name": "object2d11",
                    "value": ""
                },
                {
                    "tip": "a 2D object",
                    "type": "object2d",
                    "name": "object2d12",
                    "value": ""
                },
                {
                    "tip": "a 2D object",
                    "type": "object2d",
                    "name": "object2d13",
                    "value": ""
                },
                {
                    "tip": "a 2D object",
                    "type": "object2d",
                    "name": "object2d14",
                    "value": ""
                },
                {
                    "tip": "a 2D object",
                    "type": "object2d",
                    "name": "object2d15",
                    "value": ""
                },
                {
                    "tip": "a 2D object",
                    "type": "object2d",
                    "name": "object2d16",
                    "value": ""
                },
                {
                    "tip": "a 2D object",
                    "type": "object2d",
                    "name": "object2d17",
                    "value": ""
                },
                {
                    "tip": "a 2D object",
                    "type": "object2d",
                    "name": "object2d18",
                    "value": ""
                },
                {
                    "tip": "a 2D object",
                    "type": "object2d",
                    "name": "object2d19",
                    "value": ""
                },
                {
                    "tip": "a 2D object",
                    "type": "object2d",
                    "name": "object2d20",
                    "value": ""
                }
            ],
            "typename": "Node_boolean2d",
            "version": 1,
            "y": 98.8046532753554,
            "x": 256.2475893978301
        },
        {
            "name": "node_linearextrude",
            "inputplugs": [
                {
                    "connection": "node_boolean2d2.object2d",
                    "type": "object2d",
                    "name": "object2d",
                    "value": ""
                },
                {
                    "type": "str",
                    "name": "height",
                    "value": "150"
                },
                {
                    "type": "str",
                    "name": "center",
                    "value": "true",
                    "combo": [
                        "true",
                        "false"
                    ]
                },
                {
                    "type": "str",
                    "name": "convexity",
                    "value": "1"
                },
                {
                    "type": "str",
                    "name": "twist",
                    "value": "0"
                },
                {
                    "type": "str",
                    "name": "slices",
                    "value": "1"
                },
                {
                    "type": "str",
                    "name": "scale",
                    "value": "0.6"
                }
            ],
            "typename": "Node_linearextrude",
            "version": 1,
            "y": 126.11095859022697,
            "x": 519.6731230236505
        }
    ],
    "version": 2
}ENDGRAPHSCAD*/
